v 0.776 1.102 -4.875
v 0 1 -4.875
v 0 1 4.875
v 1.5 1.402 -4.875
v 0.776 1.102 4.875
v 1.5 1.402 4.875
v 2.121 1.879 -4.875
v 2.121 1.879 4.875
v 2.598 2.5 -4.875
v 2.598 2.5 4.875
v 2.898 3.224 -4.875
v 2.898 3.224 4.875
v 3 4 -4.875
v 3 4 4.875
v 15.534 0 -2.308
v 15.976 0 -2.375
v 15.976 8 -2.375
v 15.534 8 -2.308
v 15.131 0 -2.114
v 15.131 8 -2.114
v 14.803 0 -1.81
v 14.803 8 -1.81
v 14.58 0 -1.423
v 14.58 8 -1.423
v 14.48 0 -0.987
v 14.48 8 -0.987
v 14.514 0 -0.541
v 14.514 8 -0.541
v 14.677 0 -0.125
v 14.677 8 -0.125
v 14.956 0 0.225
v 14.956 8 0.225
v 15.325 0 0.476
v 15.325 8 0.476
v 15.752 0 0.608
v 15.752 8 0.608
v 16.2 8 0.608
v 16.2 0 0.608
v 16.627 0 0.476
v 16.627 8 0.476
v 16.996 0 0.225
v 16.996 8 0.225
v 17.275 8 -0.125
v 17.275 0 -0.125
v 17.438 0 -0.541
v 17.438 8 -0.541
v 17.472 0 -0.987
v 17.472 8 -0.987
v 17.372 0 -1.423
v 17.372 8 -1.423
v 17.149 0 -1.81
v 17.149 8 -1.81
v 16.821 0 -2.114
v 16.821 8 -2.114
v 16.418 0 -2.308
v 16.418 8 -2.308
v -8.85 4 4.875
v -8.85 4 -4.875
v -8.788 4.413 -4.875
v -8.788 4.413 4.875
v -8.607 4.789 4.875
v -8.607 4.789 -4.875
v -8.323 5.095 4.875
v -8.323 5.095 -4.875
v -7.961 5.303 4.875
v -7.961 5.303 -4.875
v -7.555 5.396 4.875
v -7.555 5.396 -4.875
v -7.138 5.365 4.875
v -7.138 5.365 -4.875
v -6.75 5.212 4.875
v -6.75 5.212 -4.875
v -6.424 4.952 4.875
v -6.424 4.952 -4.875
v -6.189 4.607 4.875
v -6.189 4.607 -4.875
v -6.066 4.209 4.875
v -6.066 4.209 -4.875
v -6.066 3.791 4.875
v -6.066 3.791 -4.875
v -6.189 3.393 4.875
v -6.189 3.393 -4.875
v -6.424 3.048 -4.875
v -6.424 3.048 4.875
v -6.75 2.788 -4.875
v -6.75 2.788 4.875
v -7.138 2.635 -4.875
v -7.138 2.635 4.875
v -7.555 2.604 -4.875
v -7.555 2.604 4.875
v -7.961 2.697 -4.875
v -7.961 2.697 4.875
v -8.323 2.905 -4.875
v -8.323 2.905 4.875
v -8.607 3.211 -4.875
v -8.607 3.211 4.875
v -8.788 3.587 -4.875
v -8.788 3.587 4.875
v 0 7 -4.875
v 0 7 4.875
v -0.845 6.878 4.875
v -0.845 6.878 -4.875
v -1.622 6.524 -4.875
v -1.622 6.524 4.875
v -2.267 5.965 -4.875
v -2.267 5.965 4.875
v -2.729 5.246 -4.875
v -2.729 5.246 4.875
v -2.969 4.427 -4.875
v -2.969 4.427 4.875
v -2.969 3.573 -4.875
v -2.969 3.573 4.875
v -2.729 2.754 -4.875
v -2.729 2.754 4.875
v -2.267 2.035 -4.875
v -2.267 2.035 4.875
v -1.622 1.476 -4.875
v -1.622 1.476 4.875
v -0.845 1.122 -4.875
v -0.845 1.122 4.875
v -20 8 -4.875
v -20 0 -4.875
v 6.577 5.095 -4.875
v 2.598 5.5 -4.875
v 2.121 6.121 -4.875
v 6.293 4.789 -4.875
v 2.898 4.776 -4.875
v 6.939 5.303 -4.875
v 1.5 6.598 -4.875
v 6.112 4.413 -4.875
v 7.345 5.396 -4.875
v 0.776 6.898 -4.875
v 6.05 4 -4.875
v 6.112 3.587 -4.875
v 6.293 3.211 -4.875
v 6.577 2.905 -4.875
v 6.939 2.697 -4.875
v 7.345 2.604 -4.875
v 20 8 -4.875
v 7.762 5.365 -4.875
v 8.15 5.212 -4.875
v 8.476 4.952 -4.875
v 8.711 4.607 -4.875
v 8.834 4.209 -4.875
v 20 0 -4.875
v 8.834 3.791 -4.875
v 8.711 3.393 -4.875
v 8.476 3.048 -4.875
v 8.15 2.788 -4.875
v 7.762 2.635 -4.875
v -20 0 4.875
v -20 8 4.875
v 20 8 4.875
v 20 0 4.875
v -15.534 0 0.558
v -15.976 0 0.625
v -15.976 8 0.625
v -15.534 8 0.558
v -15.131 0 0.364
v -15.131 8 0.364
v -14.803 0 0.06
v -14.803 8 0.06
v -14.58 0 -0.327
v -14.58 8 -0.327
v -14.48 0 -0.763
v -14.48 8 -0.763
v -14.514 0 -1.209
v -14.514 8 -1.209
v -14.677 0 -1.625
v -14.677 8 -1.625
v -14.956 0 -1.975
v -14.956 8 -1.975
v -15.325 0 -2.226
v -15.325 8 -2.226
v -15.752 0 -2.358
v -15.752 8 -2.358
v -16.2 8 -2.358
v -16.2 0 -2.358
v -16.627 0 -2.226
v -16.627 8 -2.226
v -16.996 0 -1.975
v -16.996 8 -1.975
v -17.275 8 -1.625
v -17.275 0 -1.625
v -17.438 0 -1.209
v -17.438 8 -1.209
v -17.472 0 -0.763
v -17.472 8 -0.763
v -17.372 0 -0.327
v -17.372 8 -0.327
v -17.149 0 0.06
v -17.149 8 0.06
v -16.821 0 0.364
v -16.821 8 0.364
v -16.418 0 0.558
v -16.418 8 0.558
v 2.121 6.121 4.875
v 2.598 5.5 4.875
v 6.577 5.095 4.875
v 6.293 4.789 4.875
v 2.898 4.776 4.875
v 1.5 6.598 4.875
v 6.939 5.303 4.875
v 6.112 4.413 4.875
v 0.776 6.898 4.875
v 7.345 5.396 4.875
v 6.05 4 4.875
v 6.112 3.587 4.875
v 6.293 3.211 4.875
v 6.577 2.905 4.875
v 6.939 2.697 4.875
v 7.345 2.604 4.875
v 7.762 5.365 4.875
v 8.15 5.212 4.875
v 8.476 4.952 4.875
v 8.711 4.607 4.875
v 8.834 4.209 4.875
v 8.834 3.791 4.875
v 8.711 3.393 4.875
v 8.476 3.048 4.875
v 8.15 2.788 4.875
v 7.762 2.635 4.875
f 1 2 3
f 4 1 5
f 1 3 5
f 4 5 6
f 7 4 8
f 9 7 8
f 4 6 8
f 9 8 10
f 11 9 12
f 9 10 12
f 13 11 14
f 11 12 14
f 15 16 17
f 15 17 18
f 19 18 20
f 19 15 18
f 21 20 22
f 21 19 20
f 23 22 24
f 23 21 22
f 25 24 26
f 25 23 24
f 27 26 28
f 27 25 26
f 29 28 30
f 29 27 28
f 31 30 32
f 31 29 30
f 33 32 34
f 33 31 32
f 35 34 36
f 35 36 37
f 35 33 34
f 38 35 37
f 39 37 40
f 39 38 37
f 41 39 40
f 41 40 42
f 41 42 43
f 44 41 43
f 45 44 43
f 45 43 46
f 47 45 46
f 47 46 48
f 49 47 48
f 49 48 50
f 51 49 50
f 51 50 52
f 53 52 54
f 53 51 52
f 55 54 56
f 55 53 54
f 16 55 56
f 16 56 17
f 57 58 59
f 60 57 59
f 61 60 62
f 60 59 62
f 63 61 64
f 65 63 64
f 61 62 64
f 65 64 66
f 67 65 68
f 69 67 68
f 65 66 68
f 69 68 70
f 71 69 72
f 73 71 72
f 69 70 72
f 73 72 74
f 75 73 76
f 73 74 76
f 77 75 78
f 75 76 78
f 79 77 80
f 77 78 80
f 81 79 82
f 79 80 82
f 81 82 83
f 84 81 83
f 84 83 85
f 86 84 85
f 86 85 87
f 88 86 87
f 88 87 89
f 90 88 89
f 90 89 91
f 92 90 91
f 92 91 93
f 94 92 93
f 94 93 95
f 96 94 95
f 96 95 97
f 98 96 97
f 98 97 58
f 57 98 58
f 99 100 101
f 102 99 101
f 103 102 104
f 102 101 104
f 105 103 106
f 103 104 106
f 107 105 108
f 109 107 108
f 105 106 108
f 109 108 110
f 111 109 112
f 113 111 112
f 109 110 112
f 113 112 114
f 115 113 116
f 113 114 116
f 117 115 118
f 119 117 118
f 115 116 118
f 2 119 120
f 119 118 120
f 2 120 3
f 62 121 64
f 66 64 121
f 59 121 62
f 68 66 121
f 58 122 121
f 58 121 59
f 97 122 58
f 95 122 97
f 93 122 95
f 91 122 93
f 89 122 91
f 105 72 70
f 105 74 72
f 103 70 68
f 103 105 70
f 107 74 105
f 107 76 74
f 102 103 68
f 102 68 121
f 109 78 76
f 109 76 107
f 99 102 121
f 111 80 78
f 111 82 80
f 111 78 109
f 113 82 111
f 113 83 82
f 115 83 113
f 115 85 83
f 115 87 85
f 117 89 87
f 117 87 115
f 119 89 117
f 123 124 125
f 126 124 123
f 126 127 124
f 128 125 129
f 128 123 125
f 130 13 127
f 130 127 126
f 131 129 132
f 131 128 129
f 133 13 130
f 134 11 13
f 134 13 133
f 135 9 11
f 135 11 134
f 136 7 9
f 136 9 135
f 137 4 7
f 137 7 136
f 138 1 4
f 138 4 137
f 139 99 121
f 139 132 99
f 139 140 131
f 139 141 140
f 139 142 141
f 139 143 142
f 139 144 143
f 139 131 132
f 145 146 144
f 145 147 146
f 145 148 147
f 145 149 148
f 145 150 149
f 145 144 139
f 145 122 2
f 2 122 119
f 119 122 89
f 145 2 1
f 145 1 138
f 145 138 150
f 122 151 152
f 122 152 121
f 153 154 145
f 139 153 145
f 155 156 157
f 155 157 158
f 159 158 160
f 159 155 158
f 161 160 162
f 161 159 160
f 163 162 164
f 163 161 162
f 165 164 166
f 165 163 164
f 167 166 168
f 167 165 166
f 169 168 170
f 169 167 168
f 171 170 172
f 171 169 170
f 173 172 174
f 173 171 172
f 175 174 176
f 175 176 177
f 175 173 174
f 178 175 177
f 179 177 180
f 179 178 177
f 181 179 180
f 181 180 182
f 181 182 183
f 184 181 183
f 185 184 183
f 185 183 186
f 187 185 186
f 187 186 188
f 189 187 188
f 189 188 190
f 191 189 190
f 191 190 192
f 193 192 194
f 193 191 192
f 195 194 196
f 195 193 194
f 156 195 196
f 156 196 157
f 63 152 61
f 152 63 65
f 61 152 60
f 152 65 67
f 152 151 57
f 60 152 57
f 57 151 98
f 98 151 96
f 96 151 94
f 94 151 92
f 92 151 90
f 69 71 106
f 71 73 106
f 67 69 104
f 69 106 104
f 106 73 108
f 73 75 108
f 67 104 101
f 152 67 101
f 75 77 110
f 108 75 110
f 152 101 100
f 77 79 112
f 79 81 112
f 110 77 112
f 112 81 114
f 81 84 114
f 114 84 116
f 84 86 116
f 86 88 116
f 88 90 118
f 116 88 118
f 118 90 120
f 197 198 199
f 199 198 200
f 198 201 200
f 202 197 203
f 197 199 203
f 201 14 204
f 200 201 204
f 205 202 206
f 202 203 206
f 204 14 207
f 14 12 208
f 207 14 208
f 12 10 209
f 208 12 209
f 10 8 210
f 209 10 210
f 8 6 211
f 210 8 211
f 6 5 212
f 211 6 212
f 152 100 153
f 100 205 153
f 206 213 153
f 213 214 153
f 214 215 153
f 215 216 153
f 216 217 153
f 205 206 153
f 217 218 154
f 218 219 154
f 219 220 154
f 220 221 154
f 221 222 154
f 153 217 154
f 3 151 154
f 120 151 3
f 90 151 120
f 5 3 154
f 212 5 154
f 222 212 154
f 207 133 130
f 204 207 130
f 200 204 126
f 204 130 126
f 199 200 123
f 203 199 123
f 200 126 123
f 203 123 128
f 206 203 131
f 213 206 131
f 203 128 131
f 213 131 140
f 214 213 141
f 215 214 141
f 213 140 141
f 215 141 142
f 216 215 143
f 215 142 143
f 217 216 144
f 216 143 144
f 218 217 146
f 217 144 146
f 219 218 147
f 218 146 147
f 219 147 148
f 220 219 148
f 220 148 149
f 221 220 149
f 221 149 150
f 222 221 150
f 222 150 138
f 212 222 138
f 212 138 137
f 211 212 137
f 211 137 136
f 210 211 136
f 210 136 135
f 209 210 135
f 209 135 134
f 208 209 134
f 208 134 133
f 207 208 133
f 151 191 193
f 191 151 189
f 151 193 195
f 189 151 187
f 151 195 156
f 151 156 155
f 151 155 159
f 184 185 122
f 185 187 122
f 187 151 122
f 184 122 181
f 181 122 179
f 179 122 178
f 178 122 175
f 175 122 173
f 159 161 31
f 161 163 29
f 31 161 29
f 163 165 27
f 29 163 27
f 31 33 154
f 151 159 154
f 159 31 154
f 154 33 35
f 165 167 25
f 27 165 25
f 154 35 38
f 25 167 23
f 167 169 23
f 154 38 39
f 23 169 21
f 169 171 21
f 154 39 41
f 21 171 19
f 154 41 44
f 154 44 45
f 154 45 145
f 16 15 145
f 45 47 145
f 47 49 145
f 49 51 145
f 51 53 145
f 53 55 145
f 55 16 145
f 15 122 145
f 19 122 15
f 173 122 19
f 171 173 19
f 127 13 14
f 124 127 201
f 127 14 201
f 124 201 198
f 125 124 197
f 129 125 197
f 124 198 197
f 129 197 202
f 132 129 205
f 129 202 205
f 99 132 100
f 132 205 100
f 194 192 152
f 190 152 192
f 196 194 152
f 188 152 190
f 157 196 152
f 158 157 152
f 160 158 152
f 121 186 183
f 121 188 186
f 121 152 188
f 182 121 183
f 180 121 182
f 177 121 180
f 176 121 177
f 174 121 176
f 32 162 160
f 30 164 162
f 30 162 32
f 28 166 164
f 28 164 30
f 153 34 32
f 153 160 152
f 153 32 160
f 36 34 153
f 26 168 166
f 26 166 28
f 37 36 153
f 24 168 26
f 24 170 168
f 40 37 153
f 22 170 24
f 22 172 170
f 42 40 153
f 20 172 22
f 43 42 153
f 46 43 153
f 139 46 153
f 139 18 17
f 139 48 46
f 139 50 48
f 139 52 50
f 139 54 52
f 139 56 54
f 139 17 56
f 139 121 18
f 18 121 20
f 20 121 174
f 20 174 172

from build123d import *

# Parameters (mm, degrees)
SKETCH1_W           = 40
SKETCH1_H           = 9.75
SKETCH1_R           = 1.5
BOSS_EXTRUDE1_DEPTH = 8
CUT_EXTRUDE1_REACH  = 25.645
CUT_EXTRUDE2_REACH  = 25.645
SKETCH3_R           = 1.4


with BuildPart() as part:
    # Sketch1 → Boss-Extrude1 (new body)
    with BuildSketch(Plane(origin=(0, 0, 0), x_dir=(1, 0, 0), z_dir=(0, 1, 0))):
        Rectangle(SKETCH1_W, SKETCH1_H)
        with Locations(Location((-15.976056303, 0.875, 0), (0, 0, 270))):
            Circle(SKETCH1_R, mode=Mode.SUBTRACT)
        with Locations(Location((15.976056303, 0.875, 0), (0, 0, 90))):
            Circle(SKETCH1_R, mode=Mode.SUBTRACT)
    extrude(amount=BOSS_EXTRUDE1_DEPTH)

    # Sketch2 → Cut-Extrude1 (cut, up to next)
    with BuildSketch(Plane.XY.offset(4.875), mode=Mode.PRIVATE) as cut_extrude1_sk1:
        with BuildLine():
            ThreePointArc((3, 4), (2.121320344, 6.121320344), (0, 7))
            Line((0, 7), (0, 1))
            ThreePointArc((0, 1), (2.121320344, 1.878679656), (3, 4))
        make_face()
    cut_extrude1_tool1 = extrude(cut_extrude1_sk1.sketch, amount=-CUT_EXTRUDE1_REACH, mode=Mode.PRIVATE) & part.part
    # Sketch2 → Cut-Extrude1 (cut, up to next)
    with BuildSketch(Plane.XY.offset(4.875), mode=Mode.PRIVATE) as cut_extrude1_sk2:
        with BuildLine():
            Line((0, 1), (0, 7))
            ThreePointArc((0, 7), (-3, 4), (0, 1))
        make_face()
    cut_extrude1_tool2 = extrude(cut_extrude1_sk2.sketch, amount=-CUT_EXTRUDE1_REACH, mode=Mode.PRIVATE) & part.part
    # Sketch2 → Cut-Extrude1 (cut, up to next)
    with BuildSketch(Plane.XY.offset(4.875), mode=Mode.PRIVATE) as cut_extrude1_sk3:
        with BuildLine():
            ThreePointArc((3, 4), (2.121320344, 6.121320344), (0, 7))
            Line((0, 7), (0, 1))
            ThreePointArc((0, 1), (2.121320344, 1.878679656), (3, 4))
        make_face()
    cut_extrude1_tool3 = extrude(cut_extrude1_sk3.sketch, amount=-CUT_EXTRUDE1_REACH, mode=Mode.PRIVATE) & part.part
    # Sketch2 → Cut-Extrude1 (cut, up to next)
    with BuildSketch(Plane.XY.offset(4.875), mode=Mode.PRIVATE) as cut_extrude1_sk4:
        with BuildLine():
            Line((0, 1), (0, 7))
            ThreePointArc((0, 7), (-3, 4), (0, 1))
        make_face()
    cut_extrude1_tool4 = extrude(cut_extrude1_sk4.sketch, amount=-CUT_EXTRUDE1_REACH, mode=Mode.PRIVATE) & part.part
    add(cut_extrude1_tool1.solids().sort_by_distance((1.27324, 4, 4.875))[0], mode=Mode.SUBTRACT)
    add(cut_extrude1_tool2.solids().sort_by_distance((-1.27324, 4, 4.875))[0], mode=Mode.SUBTRACT)
    add(cut_extrude1_tool3.solids().sort_by_distance((1.27324, 4, 4.875))[0], mode=Mode.SUBTRACT)
    add(cut_extrude1_tool4.solids().sort_by_distance((-1.27324, 4, 4.875))[0], mode=Mode.SUBTRACT)

    # Sketch3 → Cut-Extrude2 (cut, up to next)
    with BuildSketch(Plane(origin=(0, 0, -4.875), x_dir=(-1, 0, 0), z_dir=(0, 0, -1)), mode=Mode.PRIVATE) as cut_extrude2_sk1:
        with Locations((7.45, 4)):
            Circle(SKETCH3_R)
    cut_extrude2_tool1 = extrude(cut_extrude2_sk1.sketch, amount=-CUT_EXTRUDE2_REACH, mode=Mode.PRIVATE) & part.part
    # Sketch3 → Cut-Extrude2 (cut, up to next)
    with BuildSketch(Plane(origin=(0, 0, -4.875), x_dir=(-1, 0, 0), z_dir=(0, 0, -1)), mode=Mode.PRIVATE) as cut_extrude2_sk2:
        with Locations((-7.45, 4)):
            Circle(SKETCH3_R)
    cut_extrude2_tool2 = extrude(cut_extrude2_sk2.sketch, amount=-CUT_EXTRUDE2_REACH, mode=Mode.PRIVATE) & part.part
    add(cut_extrude2_tool1.solids().sort_by_distance((-7.45, 4, -4.875))[0], mode=Mode.SUBTRACT)
    add(cut_extrude2_tool2.solids().sort_by_distance((7.45, 4, -4.875))[0], mode=Mode.SUBTRACT)


solid = part.part
